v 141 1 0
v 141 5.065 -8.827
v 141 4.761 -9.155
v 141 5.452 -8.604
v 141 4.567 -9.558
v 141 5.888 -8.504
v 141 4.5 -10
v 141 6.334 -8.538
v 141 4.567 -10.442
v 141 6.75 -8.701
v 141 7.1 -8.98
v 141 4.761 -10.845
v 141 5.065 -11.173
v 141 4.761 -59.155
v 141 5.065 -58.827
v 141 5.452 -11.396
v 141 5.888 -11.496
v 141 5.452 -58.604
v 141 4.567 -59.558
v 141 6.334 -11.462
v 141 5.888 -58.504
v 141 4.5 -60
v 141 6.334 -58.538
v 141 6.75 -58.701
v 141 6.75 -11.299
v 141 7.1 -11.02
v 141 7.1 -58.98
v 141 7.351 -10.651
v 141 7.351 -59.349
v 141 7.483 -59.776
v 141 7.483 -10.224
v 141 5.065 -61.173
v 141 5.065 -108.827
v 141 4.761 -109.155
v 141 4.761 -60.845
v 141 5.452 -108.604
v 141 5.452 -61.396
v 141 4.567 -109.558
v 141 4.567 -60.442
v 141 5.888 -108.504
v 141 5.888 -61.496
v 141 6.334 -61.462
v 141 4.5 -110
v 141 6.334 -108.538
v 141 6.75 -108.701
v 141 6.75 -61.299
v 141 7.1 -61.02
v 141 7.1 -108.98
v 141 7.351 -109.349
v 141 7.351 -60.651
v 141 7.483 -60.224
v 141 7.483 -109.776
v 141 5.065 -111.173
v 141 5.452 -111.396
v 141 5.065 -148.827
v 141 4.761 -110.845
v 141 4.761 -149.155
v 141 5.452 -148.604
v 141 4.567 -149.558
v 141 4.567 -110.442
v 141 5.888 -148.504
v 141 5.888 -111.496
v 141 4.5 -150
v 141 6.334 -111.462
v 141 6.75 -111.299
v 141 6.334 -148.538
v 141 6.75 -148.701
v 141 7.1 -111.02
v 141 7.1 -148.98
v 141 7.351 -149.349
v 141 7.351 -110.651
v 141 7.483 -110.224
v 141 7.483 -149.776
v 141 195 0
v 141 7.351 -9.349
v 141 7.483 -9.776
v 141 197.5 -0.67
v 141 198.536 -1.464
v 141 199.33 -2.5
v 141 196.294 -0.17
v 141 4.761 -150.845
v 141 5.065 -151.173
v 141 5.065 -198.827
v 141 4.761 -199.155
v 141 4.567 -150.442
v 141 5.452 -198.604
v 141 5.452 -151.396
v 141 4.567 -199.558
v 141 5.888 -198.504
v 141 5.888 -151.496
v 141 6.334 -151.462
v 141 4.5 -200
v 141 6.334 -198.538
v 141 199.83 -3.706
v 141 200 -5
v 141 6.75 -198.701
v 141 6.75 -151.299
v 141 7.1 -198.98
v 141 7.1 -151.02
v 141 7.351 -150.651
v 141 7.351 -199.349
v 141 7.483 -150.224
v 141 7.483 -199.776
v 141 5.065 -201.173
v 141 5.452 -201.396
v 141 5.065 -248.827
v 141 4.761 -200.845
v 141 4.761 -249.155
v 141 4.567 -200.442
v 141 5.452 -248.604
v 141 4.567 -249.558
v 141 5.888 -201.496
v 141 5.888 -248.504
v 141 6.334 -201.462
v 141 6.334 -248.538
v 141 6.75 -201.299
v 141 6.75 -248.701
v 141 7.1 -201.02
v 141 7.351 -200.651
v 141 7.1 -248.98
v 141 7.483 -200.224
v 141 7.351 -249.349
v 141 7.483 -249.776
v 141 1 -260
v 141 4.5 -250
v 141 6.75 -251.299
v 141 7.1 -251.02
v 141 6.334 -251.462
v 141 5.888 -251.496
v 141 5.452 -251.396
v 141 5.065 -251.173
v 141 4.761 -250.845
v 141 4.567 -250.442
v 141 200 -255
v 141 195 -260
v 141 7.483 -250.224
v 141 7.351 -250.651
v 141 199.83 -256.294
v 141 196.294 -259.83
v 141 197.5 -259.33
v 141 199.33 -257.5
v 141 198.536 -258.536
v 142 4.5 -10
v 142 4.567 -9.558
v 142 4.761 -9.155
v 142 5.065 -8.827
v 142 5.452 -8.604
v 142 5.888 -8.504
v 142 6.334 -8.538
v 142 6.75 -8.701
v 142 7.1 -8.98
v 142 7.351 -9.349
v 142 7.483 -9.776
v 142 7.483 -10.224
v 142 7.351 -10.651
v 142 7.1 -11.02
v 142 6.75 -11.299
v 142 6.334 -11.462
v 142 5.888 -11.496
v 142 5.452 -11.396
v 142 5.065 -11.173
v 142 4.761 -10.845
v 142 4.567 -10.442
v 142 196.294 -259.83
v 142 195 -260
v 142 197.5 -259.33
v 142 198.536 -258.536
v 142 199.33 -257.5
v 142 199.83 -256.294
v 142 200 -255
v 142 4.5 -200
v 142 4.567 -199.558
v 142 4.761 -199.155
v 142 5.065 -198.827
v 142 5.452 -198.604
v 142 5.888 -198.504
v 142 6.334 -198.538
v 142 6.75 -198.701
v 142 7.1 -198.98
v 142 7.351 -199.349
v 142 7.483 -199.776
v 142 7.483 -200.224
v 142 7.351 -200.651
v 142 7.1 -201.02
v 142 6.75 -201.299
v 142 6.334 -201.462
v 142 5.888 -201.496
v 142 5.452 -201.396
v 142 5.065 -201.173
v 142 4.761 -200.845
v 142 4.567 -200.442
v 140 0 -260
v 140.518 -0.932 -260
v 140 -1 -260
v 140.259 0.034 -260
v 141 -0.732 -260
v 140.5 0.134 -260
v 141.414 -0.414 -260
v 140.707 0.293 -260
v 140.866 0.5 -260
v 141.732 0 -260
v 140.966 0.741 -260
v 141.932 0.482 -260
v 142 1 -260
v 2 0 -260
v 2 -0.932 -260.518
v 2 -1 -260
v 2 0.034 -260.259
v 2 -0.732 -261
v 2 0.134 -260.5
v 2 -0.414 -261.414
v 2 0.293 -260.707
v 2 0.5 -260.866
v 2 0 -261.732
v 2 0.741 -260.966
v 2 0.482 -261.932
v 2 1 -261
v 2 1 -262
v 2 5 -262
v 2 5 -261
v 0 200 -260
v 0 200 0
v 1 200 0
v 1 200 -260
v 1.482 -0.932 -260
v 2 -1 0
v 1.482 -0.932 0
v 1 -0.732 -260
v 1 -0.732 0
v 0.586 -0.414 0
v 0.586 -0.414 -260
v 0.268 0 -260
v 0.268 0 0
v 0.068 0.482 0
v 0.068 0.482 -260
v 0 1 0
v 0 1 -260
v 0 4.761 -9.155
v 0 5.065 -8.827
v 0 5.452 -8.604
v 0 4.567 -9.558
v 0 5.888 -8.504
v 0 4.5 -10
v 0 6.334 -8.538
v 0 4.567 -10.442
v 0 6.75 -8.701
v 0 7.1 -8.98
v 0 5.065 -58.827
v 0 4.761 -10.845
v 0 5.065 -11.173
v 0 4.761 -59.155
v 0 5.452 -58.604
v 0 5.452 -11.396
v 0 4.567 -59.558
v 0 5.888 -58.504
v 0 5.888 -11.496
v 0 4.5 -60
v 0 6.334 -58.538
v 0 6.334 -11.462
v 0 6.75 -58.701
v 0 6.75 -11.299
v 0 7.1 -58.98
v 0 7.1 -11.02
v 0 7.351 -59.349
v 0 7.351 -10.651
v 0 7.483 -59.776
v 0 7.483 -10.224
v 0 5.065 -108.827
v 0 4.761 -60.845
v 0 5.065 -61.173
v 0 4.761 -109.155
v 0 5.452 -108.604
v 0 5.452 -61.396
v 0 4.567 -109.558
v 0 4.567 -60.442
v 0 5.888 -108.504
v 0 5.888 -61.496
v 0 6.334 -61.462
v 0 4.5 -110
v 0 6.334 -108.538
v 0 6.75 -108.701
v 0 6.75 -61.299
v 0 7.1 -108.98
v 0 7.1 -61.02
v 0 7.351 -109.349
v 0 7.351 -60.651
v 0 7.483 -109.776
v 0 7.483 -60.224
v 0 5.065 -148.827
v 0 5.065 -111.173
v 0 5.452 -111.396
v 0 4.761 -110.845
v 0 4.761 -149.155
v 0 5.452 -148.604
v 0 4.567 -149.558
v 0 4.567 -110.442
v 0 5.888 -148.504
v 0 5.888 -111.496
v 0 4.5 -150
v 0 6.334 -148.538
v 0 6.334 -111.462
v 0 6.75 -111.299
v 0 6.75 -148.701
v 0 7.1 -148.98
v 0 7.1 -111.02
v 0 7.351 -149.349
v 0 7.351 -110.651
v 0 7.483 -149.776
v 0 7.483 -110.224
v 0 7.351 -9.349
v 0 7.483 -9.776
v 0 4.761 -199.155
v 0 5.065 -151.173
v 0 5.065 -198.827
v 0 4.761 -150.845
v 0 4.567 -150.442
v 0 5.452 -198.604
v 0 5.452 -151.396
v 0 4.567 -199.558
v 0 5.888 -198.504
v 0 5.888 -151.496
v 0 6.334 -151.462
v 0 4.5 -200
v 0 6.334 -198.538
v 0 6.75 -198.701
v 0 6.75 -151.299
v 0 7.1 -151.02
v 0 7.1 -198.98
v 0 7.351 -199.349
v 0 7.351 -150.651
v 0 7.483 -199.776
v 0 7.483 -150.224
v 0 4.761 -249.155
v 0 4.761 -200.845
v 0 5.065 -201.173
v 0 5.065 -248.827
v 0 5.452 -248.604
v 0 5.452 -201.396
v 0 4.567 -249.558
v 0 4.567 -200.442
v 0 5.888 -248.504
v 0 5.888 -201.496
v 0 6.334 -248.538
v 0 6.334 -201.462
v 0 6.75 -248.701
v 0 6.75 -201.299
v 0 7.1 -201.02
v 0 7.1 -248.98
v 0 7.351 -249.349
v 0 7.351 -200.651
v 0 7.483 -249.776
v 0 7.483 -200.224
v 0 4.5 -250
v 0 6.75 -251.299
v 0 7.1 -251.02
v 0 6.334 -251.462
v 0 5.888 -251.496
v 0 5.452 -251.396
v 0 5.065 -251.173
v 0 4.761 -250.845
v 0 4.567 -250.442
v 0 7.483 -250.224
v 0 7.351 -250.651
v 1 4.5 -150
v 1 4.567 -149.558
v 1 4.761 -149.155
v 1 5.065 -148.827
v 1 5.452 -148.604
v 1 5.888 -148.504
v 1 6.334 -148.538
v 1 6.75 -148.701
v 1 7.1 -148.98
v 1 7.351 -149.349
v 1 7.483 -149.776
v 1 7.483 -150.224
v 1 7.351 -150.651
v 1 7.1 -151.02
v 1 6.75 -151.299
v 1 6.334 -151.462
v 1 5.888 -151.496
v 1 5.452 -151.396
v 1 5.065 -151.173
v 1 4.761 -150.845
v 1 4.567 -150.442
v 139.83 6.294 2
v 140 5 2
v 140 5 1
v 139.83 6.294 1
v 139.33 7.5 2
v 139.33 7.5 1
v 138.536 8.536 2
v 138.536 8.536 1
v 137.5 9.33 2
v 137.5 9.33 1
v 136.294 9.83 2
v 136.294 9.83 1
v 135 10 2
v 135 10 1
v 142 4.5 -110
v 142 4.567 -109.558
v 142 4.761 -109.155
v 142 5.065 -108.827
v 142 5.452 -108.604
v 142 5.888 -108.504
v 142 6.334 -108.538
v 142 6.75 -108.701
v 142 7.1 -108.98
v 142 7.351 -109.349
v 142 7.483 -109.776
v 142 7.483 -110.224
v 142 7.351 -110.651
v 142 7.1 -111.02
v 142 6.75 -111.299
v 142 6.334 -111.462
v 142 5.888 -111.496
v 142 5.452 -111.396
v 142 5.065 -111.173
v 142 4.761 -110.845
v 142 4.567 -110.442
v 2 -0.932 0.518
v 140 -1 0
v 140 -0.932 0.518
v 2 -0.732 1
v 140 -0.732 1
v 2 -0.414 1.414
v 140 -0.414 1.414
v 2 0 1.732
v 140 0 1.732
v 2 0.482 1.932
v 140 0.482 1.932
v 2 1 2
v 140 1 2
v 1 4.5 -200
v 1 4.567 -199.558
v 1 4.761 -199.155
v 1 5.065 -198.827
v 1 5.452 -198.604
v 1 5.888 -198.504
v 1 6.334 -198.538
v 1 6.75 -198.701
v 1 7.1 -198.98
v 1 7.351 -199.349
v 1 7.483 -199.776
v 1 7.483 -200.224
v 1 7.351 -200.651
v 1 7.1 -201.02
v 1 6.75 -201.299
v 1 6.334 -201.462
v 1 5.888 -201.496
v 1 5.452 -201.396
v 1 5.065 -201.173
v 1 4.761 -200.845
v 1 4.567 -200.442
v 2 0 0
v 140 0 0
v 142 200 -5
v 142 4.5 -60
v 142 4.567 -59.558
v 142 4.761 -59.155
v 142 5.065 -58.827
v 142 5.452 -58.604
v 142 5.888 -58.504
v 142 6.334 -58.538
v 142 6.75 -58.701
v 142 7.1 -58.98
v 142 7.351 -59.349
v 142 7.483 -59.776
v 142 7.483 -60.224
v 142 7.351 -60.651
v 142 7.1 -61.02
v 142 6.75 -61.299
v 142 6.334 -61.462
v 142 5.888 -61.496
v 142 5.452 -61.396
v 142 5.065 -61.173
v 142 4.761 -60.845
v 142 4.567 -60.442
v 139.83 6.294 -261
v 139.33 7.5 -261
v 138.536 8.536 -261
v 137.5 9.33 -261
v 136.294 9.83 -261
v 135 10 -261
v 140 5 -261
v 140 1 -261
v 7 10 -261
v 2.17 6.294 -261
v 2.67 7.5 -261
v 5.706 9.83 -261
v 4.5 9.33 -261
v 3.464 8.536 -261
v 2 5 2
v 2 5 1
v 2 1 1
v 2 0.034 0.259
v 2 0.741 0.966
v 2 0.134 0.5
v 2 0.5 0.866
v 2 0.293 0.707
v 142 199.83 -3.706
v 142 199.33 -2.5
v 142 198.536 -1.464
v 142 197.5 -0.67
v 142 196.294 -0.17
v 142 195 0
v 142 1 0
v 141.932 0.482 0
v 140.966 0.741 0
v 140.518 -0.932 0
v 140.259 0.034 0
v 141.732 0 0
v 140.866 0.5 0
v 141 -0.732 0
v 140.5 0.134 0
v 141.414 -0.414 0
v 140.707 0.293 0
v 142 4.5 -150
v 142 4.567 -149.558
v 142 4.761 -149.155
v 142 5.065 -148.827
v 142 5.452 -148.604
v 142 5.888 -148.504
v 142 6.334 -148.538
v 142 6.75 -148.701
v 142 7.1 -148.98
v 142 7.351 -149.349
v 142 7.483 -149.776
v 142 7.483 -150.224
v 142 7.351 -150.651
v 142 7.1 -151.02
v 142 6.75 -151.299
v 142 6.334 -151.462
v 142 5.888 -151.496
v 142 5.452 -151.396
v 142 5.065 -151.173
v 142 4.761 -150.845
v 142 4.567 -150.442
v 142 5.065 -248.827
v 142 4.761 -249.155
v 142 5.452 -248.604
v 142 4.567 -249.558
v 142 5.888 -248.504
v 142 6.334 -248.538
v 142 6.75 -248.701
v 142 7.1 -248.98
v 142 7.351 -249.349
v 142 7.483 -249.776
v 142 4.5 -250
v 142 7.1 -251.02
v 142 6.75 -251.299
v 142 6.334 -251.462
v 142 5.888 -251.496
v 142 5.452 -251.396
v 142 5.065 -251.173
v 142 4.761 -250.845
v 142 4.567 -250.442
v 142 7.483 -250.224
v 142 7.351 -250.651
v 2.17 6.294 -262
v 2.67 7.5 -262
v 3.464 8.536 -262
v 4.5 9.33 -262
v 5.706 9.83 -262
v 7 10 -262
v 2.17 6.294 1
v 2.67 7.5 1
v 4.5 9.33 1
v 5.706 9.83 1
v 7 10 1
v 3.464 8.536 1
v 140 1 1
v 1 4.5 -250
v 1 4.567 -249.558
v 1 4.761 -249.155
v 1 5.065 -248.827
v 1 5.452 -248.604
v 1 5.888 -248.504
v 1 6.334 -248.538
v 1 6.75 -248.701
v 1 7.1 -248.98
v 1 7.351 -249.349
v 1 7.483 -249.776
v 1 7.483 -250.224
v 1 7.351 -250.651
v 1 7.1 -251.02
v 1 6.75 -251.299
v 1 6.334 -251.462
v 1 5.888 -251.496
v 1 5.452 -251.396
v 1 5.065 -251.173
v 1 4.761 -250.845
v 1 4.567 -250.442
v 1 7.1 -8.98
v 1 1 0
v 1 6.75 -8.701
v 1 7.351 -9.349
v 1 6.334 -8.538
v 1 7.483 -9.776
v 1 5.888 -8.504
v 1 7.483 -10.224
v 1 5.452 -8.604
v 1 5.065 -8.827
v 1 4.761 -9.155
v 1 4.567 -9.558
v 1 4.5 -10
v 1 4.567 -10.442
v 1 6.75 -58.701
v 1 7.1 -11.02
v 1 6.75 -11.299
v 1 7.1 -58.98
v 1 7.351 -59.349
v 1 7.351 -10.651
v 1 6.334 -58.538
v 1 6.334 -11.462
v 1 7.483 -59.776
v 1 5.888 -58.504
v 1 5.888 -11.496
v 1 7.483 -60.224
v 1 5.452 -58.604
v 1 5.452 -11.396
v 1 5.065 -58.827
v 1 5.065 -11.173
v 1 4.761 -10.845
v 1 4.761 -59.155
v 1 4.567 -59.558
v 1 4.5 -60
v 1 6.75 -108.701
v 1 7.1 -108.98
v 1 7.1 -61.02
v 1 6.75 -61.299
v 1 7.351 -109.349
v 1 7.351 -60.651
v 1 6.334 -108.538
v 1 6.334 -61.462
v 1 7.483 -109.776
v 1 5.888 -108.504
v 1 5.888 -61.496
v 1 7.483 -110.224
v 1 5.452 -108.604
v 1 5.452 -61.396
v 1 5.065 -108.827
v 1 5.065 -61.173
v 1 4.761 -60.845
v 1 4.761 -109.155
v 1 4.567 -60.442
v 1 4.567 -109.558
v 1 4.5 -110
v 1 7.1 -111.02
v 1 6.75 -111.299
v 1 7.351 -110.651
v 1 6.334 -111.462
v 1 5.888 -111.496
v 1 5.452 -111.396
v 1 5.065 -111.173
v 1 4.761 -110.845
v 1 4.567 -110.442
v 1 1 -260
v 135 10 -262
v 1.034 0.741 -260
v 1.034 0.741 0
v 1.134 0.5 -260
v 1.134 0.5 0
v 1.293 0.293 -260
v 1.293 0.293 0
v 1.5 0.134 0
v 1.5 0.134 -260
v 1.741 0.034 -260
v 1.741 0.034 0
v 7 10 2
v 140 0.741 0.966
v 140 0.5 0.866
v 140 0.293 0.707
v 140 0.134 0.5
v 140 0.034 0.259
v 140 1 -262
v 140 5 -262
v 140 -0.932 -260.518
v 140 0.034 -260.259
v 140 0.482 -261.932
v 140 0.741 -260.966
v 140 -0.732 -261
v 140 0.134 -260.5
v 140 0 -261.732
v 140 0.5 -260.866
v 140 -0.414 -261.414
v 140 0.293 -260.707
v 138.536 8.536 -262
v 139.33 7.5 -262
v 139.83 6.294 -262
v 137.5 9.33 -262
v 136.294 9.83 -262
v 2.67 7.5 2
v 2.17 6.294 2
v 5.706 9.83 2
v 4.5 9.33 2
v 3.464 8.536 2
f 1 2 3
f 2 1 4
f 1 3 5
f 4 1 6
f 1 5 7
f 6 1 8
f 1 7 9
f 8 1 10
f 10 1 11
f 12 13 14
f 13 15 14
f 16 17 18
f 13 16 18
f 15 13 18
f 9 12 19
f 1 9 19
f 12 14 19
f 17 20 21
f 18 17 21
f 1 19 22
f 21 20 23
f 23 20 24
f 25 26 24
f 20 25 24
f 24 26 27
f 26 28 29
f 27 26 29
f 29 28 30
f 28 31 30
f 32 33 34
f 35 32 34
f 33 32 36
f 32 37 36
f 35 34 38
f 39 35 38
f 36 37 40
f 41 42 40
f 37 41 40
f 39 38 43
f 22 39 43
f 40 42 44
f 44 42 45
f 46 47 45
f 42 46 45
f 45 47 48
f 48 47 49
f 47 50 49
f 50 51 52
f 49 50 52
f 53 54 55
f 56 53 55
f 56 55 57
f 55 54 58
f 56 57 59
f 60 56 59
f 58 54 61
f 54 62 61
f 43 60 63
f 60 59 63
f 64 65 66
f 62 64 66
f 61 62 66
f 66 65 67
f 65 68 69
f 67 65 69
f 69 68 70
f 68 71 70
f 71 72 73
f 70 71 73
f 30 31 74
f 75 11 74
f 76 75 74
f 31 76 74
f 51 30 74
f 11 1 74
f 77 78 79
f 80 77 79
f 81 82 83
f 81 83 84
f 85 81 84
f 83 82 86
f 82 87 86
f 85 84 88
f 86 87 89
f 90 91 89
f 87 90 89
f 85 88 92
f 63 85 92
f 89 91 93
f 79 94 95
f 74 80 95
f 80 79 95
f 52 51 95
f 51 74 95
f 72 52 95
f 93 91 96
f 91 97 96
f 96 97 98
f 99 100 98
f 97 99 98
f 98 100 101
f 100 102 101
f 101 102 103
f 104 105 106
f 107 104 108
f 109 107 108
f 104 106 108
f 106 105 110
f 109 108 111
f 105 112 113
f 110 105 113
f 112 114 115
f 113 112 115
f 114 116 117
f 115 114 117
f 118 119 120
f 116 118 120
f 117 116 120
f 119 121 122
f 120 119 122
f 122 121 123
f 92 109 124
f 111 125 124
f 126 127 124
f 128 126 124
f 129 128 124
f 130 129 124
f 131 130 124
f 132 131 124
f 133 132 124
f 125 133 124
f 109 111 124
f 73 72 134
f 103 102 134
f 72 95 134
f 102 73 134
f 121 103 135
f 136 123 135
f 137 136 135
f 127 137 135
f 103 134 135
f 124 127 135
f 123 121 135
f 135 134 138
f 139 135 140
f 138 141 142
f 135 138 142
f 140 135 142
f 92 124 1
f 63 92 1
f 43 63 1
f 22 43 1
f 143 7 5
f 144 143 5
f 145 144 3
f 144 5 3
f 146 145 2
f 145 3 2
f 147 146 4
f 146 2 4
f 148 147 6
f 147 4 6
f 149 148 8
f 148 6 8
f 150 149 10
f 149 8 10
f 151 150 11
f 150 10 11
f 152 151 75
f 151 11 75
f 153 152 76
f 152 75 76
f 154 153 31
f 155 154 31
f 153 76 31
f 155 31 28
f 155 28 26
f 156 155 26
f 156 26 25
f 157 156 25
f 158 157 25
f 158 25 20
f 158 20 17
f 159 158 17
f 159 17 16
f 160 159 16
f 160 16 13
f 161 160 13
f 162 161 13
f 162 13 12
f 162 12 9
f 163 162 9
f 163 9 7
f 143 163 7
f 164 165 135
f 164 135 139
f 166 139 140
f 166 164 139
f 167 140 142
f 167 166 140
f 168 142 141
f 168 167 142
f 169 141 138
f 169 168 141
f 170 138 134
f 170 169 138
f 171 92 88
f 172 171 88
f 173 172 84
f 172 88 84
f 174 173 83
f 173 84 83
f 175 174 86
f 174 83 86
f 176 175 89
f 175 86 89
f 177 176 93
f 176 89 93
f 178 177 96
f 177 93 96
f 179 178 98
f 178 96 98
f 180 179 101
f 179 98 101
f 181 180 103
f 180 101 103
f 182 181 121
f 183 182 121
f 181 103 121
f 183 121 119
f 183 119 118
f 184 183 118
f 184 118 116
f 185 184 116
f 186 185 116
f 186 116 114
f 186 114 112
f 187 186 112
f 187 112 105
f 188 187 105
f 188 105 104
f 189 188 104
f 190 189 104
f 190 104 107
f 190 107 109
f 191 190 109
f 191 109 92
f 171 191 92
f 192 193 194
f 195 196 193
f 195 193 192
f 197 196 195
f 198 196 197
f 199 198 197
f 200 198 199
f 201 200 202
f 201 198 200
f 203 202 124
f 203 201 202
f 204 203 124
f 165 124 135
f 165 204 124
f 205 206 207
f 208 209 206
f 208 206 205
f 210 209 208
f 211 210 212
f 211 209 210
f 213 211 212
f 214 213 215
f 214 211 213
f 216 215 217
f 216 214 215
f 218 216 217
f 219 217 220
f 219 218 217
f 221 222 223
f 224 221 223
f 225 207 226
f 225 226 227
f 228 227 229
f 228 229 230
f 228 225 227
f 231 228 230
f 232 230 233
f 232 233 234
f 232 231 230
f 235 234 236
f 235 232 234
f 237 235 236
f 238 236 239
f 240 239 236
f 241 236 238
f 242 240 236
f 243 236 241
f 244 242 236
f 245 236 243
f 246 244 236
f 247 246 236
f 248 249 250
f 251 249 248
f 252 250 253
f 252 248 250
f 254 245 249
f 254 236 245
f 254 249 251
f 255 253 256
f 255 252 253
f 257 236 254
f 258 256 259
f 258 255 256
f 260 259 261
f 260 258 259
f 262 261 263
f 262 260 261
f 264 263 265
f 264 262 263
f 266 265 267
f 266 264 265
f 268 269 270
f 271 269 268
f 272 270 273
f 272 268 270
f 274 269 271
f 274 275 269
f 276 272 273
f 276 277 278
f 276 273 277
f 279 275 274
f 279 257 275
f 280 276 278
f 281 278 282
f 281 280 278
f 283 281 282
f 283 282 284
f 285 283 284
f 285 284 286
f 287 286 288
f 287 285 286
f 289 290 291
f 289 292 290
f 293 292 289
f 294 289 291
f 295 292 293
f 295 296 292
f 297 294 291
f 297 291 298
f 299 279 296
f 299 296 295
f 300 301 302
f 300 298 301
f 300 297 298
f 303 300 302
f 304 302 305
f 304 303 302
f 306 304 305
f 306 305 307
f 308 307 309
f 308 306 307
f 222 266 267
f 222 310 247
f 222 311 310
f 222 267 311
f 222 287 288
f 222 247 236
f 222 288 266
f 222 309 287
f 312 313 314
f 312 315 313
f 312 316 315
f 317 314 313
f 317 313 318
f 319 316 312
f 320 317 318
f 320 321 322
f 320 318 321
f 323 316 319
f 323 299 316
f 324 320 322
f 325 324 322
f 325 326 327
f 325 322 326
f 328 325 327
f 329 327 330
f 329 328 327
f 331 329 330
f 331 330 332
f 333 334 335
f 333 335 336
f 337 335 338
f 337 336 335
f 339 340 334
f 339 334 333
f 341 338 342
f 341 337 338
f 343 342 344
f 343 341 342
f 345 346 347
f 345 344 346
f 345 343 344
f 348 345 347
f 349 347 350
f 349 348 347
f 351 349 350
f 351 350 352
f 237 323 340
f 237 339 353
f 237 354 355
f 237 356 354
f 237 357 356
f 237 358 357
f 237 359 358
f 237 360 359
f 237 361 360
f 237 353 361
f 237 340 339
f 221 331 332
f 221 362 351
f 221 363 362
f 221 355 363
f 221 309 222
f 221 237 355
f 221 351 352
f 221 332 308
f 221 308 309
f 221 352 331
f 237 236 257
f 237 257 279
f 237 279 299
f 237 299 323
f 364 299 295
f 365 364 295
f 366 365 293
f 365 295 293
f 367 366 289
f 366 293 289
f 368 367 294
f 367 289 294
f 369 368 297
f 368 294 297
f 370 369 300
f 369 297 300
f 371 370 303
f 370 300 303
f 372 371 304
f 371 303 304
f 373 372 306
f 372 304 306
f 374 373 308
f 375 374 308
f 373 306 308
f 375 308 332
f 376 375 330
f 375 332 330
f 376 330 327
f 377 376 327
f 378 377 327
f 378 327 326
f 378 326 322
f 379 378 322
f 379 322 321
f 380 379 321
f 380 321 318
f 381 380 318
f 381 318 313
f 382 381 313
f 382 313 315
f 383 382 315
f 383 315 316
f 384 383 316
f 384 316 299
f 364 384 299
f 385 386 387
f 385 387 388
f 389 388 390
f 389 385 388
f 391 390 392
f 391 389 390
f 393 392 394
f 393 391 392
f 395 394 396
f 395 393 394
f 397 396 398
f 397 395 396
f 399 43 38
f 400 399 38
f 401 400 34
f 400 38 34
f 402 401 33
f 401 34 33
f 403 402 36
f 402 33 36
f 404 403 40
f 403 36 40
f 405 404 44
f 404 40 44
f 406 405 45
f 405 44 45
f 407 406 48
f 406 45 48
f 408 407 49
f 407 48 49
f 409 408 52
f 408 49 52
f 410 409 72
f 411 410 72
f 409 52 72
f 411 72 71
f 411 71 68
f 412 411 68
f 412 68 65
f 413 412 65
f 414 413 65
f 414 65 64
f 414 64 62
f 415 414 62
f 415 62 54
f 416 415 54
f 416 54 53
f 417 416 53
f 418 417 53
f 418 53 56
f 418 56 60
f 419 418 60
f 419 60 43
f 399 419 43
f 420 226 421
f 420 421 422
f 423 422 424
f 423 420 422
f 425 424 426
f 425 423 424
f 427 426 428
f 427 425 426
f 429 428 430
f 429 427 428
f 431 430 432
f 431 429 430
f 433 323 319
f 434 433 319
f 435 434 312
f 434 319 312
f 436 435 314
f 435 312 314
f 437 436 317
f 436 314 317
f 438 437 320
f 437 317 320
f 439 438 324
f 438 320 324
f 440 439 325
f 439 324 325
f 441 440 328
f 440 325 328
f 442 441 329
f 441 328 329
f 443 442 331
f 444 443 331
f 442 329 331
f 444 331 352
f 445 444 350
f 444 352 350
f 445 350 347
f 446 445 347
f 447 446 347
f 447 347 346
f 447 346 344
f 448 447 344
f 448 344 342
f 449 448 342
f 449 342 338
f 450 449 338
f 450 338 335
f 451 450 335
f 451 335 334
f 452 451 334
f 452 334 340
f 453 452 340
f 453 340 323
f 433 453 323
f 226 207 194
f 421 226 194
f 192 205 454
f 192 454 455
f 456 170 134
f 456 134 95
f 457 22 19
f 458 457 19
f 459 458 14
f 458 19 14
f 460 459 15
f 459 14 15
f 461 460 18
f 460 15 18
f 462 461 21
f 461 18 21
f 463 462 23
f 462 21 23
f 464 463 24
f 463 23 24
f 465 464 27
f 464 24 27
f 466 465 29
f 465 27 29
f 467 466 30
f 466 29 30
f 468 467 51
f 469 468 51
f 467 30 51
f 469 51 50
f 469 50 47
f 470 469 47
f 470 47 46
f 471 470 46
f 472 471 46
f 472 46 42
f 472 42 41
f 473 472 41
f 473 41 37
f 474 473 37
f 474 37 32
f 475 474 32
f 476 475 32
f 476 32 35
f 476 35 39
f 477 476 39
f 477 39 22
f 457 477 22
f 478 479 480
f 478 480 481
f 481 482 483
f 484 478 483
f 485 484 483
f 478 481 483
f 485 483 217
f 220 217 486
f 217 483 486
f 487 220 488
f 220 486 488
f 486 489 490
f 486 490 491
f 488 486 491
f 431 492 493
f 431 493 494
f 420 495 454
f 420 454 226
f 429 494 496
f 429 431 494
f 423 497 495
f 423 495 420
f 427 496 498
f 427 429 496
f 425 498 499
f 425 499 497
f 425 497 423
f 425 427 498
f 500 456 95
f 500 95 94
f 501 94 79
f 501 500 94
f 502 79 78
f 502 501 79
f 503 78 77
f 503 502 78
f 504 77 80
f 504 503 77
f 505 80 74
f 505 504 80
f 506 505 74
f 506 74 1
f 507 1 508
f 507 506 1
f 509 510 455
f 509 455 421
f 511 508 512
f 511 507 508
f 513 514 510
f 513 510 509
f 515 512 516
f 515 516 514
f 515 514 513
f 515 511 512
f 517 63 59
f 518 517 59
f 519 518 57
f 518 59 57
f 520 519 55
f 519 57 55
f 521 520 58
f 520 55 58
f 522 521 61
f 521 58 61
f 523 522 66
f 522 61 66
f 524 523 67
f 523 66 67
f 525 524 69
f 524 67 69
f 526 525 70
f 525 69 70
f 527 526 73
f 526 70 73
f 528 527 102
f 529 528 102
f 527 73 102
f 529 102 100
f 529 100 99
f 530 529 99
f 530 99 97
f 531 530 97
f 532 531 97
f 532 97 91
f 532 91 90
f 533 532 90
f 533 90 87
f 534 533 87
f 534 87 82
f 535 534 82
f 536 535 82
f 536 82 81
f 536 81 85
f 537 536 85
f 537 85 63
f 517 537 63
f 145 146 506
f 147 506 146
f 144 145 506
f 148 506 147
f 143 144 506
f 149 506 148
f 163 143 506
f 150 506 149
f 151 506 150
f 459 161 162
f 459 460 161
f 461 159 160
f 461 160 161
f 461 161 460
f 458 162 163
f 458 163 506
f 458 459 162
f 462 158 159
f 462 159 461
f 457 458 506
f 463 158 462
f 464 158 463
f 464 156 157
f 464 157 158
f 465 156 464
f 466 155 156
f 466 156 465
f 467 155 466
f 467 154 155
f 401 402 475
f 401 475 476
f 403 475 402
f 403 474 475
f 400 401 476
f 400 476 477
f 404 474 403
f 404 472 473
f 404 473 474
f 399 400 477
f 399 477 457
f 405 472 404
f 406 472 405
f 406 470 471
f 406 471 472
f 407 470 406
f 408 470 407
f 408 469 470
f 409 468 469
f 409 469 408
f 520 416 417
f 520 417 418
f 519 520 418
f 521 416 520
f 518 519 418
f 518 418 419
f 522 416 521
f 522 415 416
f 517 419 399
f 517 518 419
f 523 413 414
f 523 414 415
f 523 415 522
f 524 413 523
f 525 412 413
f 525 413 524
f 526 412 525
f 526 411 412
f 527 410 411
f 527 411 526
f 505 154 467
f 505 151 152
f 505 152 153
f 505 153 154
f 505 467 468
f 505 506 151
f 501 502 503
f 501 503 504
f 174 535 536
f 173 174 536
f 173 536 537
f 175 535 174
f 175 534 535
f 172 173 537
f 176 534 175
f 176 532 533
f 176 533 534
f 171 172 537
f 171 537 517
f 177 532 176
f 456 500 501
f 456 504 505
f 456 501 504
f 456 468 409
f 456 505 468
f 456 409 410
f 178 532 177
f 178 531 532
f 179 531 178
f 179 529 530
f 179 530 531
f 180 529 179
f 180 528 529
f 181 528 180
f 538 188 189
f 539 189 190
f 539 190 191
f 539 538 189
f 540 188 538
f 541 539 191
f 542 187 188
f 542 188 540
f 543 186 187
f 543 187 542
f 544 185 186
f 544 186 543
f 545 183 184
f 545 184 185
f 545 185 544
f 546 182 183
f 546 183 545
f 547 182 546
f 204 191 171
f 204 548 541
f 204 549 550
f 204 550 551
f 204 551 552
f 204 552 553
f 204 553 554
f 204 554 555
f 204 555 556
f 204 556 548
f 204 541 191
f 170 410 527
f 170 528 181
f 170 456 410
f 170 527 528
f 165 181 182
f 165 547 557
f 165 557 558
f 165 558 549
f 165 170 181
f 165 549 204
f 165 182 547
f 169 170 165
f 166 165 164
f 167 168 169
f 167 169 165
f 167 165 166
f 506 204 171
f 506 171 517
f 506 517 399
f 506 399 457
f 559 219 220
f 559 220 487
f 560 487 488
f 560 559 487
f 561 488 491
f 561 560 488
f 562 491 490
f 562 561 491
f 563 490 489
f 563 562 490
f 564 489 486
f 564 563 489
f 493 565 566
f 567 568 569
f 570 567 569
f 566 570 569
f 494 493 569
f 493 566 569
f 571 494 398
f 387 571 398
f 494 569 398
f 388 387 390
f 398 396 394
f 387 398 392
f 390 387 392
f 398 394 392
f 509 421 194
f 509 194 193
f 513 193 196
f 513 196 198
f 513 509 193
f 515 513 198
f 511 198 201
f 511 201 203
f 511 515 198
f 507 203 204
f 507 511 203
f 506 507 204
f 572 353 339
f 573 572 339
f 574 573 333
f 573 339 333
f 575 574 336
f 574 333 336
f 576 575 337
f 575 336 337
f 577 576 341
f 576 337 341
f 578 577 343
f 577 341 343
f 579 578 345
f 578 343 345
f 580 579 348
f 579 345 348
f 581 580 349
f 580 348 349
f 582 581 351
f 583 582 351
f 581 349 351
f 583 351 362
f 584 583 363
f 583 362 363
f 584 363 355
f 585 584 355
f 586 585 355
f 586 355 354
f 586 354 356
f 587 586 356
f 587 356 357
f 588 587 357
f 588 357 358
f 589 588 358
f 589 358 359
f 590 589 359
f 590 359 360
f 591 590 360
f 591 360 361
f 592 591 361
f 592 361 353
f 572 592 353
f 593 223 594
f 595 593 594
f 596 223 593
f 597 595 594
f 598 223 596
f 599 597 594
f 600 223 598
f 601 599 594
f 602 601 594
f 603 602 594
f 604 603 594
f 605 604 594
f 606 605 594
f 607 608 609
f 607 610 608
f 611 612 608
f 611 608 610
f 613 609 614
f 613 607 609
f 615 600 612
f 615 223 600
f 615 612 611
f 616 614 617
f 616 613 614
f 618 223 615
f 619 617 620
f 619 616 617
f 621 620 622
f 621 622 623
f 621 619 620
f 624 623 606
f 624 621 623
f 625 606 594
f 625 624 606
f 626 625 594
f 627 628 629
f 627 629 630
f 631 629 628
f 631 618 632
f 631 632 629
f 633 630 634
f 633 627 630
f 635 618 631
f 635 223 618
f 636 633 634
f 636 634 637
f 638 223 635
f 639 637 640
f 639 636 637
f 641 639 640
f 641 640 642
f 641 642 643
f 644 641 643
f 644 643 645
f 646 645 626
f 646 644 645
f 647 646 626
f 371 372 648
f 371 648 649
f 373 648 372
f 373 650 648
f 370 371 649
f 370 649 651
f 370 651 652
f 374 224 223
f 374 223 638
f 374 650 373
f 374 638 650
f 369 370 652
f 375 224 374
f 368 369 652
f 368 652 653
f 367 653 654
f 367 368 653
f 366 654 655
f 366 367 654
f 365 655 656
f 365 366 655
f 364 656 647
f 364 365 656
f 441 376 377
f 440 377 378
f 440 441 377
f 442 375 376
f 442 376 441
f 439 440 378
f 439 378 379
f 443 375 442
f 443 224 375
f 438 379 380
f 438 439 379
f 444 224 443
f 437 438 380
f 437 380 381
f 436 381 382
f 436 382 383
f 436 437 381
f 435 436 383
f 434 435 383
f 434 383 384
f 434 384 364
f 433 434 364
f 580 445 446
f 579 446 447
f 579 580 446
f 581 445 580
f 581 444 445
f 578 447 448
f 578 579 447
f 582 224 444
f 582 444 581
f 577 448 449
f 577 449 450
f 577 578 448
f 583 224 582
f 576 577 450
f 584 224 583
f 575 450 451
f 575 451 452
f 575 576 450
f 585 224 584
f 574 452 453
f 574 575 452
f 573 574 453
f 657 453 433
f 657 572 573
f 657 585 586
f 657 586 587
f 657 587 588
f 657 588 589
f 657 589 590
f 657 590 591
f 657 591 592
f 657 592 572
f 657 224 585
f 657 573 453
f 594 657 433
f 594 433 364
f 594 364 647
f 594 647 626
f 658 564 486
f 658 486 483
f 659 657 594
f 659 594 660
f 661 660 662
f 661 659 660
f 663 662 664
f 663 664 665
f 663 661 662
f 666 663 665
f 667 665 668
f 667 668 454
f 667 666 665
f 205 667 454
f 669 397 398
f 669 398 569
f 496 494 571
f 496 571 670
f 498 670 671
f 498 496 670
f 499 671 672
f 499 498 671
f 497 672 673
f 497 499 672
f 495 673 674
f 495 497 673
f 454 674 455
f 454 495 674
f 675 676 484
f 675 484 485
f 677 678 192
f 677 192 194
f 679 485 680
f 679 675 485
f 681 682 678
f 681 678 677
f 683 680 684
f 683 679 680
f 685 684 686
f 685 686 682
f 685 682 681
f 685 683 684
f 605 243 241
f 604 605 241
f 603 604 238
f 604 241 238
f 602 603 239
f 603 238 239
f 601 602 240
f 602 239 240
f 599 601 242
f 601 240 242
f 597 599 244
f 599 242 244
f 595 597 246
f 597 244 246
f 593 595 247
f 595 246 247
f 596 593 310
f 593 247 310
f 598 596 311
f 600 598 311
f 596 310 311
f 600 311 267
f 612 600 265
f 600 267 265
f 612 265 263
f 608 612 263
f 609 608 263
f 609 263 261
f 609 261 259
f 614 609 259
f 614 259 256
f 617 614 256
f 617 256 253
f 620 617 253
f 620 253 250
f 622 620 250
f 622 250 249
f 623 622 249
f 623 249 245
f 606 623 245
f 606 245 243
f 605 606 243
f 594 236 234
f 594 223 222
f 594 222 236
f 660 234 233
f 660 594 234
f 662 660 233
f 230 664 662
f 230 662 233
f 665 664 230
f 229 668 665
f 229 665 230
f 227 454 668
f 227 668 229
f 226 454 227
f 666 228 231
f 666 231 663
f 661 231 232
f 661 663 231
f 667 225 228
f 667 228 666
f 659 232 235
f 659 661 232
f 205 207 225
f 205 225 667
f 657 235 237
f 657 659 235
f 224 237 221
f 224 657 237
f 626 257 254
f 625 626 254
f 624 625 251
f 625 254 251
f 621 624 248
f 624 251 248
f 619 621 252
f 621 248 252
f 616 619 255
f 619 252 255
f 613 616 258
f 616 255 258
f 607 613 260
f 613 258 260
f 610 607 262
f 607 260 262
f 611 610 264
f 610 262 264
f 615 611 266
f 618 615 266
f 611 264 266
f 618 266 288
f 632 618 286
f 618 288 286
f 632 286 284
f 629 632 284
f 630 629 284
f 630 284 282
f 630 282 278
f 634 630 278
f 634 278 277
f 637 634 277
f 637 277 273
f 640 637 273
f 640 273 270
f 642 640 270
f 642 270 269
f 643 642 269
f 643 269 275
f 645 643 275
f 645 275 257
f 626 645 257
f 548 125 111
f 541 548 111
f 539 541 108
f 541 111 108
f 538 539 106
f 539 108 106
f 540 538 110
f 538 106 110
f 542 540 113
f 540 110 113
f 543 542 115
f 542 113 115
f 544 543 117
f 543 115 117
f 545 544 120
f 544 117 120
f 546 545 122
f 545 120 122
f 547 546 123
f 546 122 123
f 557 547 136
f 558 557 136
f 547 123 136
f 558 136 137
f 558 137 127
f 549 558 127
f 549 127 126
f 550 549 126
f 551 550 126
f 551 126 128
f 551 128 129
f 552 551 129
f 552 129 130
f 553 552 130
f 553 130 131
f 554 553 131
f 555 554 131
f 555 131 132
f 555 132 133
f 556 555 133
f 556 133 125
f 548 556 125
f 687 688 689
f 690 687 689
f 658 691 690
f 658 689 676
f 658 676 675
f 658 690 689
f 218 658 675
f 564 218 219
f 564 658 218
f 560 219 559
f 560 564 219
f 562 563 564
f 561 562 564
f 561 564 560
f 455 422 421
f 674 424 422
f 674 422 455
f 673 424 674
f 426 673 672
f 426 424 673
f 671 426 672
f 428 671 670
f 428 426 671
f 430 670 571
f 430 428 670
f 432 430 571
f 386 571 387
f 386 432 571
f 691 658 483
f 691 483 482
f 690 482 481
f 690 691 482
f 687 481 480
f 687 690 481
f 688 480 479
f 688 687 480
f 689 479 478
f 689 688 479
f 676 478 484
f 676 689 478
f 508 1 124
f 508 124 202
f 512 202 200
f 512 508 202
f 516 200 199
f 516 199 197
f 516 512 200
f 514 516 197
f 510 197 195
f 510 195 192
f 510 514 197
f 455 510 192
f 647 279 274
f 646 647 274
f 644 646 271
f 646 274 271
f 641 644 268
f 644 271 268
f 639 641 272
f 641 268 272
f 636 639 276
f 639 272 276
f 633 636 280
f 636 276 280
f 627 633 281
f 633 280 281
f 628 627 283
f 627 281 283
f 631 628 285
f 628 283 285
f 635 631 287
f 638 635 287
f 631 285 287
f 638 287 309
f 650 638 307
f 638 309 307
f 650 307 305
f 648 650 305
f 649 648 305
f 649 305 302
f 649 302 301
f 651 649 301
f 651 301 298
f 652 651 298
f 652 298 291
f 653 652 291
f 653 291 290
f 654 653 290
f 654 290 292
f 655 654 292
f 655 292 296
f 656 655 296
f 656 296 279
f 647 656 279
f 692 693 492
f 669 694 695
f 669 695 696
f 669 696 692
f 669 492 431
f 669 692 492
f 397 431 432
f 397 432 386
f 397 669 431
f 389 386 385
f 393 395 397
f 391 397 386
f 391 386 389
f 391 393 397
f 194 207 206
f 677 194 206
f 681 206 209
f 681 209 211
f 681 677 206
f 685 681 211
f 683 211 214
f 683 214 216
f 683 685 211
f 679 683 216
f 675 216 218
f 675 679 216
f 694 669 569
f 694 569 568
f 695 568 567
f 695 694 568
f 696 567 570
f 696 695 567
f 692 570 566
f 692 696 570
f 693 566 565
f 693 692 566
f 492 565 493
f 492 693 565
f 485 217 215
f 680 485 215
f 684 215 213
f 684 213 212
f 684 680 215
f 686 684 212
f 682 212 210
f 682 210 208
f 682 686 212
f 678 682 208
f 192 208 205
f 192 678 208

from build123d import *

# Parameters (mm, degrees)
SKETCH1_W                    = 142
SKETCH1_H                    = 260
BASE_FLANGE1_DEPTH           = 1
EDGE_FLANGE1_STRIP_W         = 6
EDGE_FLANGE1_STRIP_H         = 1
EDGE_FLANGE1_STRIP_CUT_DEPTH = 260
EDGE_FLANGE1_DEPTH           = 260
EDGE_FLANGE2_STRIP_W         = 6
EDGE_FLANGE2_STRIP_H         = 1
EDGE_FLANGE2_STRIP_CUT_DEPTH = 260
EDGE_FLANGE2_DEPTH           = 260
EDGE_FLANGE2_FLAT_DEPTH      = 1
EDGE_FLANGE4_DEPTH           = 138
EDGE_FLANGE4_START           = 1
EDGE_FLANGE4_FLAT_DEPTH      = 1
SKETCH12_R                   = 1.5
CUT_EXTRUDE1_DEPTH           = 157
EDGE_FLANGE5_DEPTH           = 138
EDGE_FLANGE5_START           = 1
EDGE_FLANGE5_FLAT_DEPTH      = 1


# Sheet-metal steps are written as plain solids
with BuildPart() as part:
    # Sketch1 → Base-Flange1 (new body)
    with BuildSketch(Plane(origin=(0, 0, 0), x_dir=(1, 0, 0), z_dir=(0, 1, 0))):
        with Locations((71, 130)):
            Rectangle(SKETCH1_W, SKETCH1_H)
    extrude(amount=-BASE_FLANGE1_DEPTH)

    # Edge-Flange1 strip (across the edge) → Edge-Flange1 strip cut (cut)
    with BuildSketch(Plane.XY.offset(-260)):
        with Locations((-1, -0.5)):
            Rectangle(EDGE_FLANGE1_STRIP_W, EDGE_FLANGE1_STRIP_H)
    extrude(amount=EDGE_FLANGE1_STRIP_CUT_DEPTH, mode=Mode.SUBTRACT)

    # Edge-Flange1 section (across the edge) → Edge-Flange1 (add)
    with BuildSketch(Plane.XY.offset(-260)):
        with BuildLine():
            Line((0, 1), (0, 200))
            Line((0, 200), (1, 200))
            Line((1, 200), (1, 1))
            ThreePointArc((1, 1), (1.292893219, 0.292893219), (2, 0))
            Line((2, 0), (2, -1))
            ThreePointArc((2, -1), (0.585786438, -0.414213562), (0, 1))
        make_face()
    extrude(amount=EDGE_FLANGE1_DEPTH)

    # Edge-Flange2 strip (across the edge) → Edge-Flange2 strip cut (cut)
    with BuildSketch(Plane(origin=(142, 0, 0), x_dir=(-1, 0, 0), z_dir=(0, 0, -1))):
        with Locations((-1, -0.5)):
            Rectangle(EDGE_FLANGE2_STRIP_W, EDGE_FLANGE2_STRIP_H)
    extrude(amount=EDGE_FLANGE2_STRIP_CUT_DEPTH, mode=Mode.SUBTRACT)

    # Edge-Flange2 bend section (across the edge) → Edge-Flange2 (add)
    with BuildSketch(Plane(origin=(142, 0, 0), x_dir=(-1, 0, 0), z_dir=(0, 0, -1))):
        with BuildLine():
            Line((0, 1), (1, 1))
            ThreePointArc((1, 1), (1.292893219, 0.292893219), (2, 0))
            Line((2, 0), (2, -1))
            ThreePointArc((2, -1), (0.585786438, -0.414213562), (0, 1))
        make_face()
    extrude(amount=EDGE_FLANGE2_DEPTH)

    # Edge-Flange2 profile (on flange) → Edge-Flange2 flat (add)
    with BuildSketch(Plane(origin=(142, 0, 0), x_dir=(0, 0, -1), z_dir=(1, 0, 0))):
        with BuildLine():
            ThreePointArc((5, 200), (1.464466094, 198.535533906), (0, 195))
            Line((0, 195), (0, 1))
            Line((0, 1), (260, 1))
            Line((260, 1), (260, 195))
            ThreePointArc((260, 195), (258.535533906, 198.535533906), (255, 200))
            Line((255, 200), (5, 200))
        make_face()
    extrude(amount=-EDGE_FLANGE2_FLAT_DEPTH)

    # Edge-Flange4 bend section (across the edge) → Edge-Flange4 (add)
    with BuildSketch(Plane(origin=(140, 0, -261), x_dir=(0, 0, 1), z_dir=(-1, 0, 0))):
        with BuildLine():
            Line((-1, 1), (0, 1))
            ThreePointArc((0, 1), (0.292893219, 0.292893219), (1, 0))
            Line((1, 0), (1, -1))
            ThreePointArc((1, -1), (-0.414213562, -0.414213562), (-1, 1))
        make_face()
    extrude(amount=EDGE_FLANGE4_DEPTH)

    # Edge-Flange4 profile (on flange) → Edge-Flange4 flat (add)
    with BuildSketch(Plane(origin=(0, 0, -261), x_dir=(-1, 0, 0), z_dir=(0, 0, -1)).offset(EDGE_FLANGE4_START)):
        with BuildLine():
            Line((-7, 10), (-135, 10))
            ThreePointArc((-135, 10), (-138.535533906, 8.535533906), (-140, 5))
            Line((-140, 5), (-140, 1))
            Line((-140, 1), (-2, 1))
            Line((-2, 1), (-2, 5))
            ThreePointArc((-2, 5), (-3.464466094, 8.535533906), (-7, 10))
        make_face()
    extrude(amount=-EDGE_FLANGE4_FLAT_DEPTH)

    # Sketch12 → Cut-Extrude1 (cut)
    with BuildSketch(Plane.ZY):
        with Locations(Location((-110, 6, 0), (0, 0, 270))):
            Circle(SKETCH12_R)
        with Locations(Location((-60, 6, 0), (0, 0, 270))):
            Circle(SKETCH12_R)
        with Locations(Location((-10, 6, 0), (0, 0, 270))):
            Circle(SKETCH12_R)
        with Locations(Location((-150, 6, 0), (0, 0, 270))):
            Circle(SKETCH12_R)
        with Locations(Location((-200, 6, 0), (0, 0, 270))):
            Circle(SKETCH12_R)
        with Locations(Location((-250, 6, 0), (0, 0, 270))):
            Circle(SKETCH12_R)
    extrude(amount=-CUT_EXTRUDE1_DEPTH, mode=Mode.SUBTRACT)

    # Edge-Flange5 bend section (across the edge) → Edge-Flange5 (add)
    with BuildSketch(Plane(origin=(2, 0, 1), x_dir=(0, 0, -1), z_dir=(1, 0, 0))):
        with BuildLine():
            Line((-1, 1), (0, 1))
            ThreePointArc((0, 1), (0.292893219, 0.292893219), (1, 0))
            Line((1, 0), (1, -1))
            ThreePointArc((1, -1), (-0.414213562, -0.414213562), (-1, 1))
        make_face()
    extrude(amount=EDGE_FLANGE5_DEPTH)

    # Edge-Flange5 profile (on flange) → Edge-Flange5 flat (add)
    with BuildSketch(Plane.XY.offset(1).offset(EDGE_FLANGE5_START)):
        with BuildLine():
            Line((135, 10), (7, 10))
            ThreePointArc((7, 10), (3.464466094, 8.535533906), (2, 5))
            Line((2, 5), (2, 1))
            Line((2, 1), (140, 1))
            Line((140, 1), (140, 5))
            ThreePointArc((140, 5), (138.535533906, 8.535533906), (135, 10))
        make_face()
    extrude(amount=-EDGE_FLANGE5_FLAT_DEPTH)


solid = part.part
